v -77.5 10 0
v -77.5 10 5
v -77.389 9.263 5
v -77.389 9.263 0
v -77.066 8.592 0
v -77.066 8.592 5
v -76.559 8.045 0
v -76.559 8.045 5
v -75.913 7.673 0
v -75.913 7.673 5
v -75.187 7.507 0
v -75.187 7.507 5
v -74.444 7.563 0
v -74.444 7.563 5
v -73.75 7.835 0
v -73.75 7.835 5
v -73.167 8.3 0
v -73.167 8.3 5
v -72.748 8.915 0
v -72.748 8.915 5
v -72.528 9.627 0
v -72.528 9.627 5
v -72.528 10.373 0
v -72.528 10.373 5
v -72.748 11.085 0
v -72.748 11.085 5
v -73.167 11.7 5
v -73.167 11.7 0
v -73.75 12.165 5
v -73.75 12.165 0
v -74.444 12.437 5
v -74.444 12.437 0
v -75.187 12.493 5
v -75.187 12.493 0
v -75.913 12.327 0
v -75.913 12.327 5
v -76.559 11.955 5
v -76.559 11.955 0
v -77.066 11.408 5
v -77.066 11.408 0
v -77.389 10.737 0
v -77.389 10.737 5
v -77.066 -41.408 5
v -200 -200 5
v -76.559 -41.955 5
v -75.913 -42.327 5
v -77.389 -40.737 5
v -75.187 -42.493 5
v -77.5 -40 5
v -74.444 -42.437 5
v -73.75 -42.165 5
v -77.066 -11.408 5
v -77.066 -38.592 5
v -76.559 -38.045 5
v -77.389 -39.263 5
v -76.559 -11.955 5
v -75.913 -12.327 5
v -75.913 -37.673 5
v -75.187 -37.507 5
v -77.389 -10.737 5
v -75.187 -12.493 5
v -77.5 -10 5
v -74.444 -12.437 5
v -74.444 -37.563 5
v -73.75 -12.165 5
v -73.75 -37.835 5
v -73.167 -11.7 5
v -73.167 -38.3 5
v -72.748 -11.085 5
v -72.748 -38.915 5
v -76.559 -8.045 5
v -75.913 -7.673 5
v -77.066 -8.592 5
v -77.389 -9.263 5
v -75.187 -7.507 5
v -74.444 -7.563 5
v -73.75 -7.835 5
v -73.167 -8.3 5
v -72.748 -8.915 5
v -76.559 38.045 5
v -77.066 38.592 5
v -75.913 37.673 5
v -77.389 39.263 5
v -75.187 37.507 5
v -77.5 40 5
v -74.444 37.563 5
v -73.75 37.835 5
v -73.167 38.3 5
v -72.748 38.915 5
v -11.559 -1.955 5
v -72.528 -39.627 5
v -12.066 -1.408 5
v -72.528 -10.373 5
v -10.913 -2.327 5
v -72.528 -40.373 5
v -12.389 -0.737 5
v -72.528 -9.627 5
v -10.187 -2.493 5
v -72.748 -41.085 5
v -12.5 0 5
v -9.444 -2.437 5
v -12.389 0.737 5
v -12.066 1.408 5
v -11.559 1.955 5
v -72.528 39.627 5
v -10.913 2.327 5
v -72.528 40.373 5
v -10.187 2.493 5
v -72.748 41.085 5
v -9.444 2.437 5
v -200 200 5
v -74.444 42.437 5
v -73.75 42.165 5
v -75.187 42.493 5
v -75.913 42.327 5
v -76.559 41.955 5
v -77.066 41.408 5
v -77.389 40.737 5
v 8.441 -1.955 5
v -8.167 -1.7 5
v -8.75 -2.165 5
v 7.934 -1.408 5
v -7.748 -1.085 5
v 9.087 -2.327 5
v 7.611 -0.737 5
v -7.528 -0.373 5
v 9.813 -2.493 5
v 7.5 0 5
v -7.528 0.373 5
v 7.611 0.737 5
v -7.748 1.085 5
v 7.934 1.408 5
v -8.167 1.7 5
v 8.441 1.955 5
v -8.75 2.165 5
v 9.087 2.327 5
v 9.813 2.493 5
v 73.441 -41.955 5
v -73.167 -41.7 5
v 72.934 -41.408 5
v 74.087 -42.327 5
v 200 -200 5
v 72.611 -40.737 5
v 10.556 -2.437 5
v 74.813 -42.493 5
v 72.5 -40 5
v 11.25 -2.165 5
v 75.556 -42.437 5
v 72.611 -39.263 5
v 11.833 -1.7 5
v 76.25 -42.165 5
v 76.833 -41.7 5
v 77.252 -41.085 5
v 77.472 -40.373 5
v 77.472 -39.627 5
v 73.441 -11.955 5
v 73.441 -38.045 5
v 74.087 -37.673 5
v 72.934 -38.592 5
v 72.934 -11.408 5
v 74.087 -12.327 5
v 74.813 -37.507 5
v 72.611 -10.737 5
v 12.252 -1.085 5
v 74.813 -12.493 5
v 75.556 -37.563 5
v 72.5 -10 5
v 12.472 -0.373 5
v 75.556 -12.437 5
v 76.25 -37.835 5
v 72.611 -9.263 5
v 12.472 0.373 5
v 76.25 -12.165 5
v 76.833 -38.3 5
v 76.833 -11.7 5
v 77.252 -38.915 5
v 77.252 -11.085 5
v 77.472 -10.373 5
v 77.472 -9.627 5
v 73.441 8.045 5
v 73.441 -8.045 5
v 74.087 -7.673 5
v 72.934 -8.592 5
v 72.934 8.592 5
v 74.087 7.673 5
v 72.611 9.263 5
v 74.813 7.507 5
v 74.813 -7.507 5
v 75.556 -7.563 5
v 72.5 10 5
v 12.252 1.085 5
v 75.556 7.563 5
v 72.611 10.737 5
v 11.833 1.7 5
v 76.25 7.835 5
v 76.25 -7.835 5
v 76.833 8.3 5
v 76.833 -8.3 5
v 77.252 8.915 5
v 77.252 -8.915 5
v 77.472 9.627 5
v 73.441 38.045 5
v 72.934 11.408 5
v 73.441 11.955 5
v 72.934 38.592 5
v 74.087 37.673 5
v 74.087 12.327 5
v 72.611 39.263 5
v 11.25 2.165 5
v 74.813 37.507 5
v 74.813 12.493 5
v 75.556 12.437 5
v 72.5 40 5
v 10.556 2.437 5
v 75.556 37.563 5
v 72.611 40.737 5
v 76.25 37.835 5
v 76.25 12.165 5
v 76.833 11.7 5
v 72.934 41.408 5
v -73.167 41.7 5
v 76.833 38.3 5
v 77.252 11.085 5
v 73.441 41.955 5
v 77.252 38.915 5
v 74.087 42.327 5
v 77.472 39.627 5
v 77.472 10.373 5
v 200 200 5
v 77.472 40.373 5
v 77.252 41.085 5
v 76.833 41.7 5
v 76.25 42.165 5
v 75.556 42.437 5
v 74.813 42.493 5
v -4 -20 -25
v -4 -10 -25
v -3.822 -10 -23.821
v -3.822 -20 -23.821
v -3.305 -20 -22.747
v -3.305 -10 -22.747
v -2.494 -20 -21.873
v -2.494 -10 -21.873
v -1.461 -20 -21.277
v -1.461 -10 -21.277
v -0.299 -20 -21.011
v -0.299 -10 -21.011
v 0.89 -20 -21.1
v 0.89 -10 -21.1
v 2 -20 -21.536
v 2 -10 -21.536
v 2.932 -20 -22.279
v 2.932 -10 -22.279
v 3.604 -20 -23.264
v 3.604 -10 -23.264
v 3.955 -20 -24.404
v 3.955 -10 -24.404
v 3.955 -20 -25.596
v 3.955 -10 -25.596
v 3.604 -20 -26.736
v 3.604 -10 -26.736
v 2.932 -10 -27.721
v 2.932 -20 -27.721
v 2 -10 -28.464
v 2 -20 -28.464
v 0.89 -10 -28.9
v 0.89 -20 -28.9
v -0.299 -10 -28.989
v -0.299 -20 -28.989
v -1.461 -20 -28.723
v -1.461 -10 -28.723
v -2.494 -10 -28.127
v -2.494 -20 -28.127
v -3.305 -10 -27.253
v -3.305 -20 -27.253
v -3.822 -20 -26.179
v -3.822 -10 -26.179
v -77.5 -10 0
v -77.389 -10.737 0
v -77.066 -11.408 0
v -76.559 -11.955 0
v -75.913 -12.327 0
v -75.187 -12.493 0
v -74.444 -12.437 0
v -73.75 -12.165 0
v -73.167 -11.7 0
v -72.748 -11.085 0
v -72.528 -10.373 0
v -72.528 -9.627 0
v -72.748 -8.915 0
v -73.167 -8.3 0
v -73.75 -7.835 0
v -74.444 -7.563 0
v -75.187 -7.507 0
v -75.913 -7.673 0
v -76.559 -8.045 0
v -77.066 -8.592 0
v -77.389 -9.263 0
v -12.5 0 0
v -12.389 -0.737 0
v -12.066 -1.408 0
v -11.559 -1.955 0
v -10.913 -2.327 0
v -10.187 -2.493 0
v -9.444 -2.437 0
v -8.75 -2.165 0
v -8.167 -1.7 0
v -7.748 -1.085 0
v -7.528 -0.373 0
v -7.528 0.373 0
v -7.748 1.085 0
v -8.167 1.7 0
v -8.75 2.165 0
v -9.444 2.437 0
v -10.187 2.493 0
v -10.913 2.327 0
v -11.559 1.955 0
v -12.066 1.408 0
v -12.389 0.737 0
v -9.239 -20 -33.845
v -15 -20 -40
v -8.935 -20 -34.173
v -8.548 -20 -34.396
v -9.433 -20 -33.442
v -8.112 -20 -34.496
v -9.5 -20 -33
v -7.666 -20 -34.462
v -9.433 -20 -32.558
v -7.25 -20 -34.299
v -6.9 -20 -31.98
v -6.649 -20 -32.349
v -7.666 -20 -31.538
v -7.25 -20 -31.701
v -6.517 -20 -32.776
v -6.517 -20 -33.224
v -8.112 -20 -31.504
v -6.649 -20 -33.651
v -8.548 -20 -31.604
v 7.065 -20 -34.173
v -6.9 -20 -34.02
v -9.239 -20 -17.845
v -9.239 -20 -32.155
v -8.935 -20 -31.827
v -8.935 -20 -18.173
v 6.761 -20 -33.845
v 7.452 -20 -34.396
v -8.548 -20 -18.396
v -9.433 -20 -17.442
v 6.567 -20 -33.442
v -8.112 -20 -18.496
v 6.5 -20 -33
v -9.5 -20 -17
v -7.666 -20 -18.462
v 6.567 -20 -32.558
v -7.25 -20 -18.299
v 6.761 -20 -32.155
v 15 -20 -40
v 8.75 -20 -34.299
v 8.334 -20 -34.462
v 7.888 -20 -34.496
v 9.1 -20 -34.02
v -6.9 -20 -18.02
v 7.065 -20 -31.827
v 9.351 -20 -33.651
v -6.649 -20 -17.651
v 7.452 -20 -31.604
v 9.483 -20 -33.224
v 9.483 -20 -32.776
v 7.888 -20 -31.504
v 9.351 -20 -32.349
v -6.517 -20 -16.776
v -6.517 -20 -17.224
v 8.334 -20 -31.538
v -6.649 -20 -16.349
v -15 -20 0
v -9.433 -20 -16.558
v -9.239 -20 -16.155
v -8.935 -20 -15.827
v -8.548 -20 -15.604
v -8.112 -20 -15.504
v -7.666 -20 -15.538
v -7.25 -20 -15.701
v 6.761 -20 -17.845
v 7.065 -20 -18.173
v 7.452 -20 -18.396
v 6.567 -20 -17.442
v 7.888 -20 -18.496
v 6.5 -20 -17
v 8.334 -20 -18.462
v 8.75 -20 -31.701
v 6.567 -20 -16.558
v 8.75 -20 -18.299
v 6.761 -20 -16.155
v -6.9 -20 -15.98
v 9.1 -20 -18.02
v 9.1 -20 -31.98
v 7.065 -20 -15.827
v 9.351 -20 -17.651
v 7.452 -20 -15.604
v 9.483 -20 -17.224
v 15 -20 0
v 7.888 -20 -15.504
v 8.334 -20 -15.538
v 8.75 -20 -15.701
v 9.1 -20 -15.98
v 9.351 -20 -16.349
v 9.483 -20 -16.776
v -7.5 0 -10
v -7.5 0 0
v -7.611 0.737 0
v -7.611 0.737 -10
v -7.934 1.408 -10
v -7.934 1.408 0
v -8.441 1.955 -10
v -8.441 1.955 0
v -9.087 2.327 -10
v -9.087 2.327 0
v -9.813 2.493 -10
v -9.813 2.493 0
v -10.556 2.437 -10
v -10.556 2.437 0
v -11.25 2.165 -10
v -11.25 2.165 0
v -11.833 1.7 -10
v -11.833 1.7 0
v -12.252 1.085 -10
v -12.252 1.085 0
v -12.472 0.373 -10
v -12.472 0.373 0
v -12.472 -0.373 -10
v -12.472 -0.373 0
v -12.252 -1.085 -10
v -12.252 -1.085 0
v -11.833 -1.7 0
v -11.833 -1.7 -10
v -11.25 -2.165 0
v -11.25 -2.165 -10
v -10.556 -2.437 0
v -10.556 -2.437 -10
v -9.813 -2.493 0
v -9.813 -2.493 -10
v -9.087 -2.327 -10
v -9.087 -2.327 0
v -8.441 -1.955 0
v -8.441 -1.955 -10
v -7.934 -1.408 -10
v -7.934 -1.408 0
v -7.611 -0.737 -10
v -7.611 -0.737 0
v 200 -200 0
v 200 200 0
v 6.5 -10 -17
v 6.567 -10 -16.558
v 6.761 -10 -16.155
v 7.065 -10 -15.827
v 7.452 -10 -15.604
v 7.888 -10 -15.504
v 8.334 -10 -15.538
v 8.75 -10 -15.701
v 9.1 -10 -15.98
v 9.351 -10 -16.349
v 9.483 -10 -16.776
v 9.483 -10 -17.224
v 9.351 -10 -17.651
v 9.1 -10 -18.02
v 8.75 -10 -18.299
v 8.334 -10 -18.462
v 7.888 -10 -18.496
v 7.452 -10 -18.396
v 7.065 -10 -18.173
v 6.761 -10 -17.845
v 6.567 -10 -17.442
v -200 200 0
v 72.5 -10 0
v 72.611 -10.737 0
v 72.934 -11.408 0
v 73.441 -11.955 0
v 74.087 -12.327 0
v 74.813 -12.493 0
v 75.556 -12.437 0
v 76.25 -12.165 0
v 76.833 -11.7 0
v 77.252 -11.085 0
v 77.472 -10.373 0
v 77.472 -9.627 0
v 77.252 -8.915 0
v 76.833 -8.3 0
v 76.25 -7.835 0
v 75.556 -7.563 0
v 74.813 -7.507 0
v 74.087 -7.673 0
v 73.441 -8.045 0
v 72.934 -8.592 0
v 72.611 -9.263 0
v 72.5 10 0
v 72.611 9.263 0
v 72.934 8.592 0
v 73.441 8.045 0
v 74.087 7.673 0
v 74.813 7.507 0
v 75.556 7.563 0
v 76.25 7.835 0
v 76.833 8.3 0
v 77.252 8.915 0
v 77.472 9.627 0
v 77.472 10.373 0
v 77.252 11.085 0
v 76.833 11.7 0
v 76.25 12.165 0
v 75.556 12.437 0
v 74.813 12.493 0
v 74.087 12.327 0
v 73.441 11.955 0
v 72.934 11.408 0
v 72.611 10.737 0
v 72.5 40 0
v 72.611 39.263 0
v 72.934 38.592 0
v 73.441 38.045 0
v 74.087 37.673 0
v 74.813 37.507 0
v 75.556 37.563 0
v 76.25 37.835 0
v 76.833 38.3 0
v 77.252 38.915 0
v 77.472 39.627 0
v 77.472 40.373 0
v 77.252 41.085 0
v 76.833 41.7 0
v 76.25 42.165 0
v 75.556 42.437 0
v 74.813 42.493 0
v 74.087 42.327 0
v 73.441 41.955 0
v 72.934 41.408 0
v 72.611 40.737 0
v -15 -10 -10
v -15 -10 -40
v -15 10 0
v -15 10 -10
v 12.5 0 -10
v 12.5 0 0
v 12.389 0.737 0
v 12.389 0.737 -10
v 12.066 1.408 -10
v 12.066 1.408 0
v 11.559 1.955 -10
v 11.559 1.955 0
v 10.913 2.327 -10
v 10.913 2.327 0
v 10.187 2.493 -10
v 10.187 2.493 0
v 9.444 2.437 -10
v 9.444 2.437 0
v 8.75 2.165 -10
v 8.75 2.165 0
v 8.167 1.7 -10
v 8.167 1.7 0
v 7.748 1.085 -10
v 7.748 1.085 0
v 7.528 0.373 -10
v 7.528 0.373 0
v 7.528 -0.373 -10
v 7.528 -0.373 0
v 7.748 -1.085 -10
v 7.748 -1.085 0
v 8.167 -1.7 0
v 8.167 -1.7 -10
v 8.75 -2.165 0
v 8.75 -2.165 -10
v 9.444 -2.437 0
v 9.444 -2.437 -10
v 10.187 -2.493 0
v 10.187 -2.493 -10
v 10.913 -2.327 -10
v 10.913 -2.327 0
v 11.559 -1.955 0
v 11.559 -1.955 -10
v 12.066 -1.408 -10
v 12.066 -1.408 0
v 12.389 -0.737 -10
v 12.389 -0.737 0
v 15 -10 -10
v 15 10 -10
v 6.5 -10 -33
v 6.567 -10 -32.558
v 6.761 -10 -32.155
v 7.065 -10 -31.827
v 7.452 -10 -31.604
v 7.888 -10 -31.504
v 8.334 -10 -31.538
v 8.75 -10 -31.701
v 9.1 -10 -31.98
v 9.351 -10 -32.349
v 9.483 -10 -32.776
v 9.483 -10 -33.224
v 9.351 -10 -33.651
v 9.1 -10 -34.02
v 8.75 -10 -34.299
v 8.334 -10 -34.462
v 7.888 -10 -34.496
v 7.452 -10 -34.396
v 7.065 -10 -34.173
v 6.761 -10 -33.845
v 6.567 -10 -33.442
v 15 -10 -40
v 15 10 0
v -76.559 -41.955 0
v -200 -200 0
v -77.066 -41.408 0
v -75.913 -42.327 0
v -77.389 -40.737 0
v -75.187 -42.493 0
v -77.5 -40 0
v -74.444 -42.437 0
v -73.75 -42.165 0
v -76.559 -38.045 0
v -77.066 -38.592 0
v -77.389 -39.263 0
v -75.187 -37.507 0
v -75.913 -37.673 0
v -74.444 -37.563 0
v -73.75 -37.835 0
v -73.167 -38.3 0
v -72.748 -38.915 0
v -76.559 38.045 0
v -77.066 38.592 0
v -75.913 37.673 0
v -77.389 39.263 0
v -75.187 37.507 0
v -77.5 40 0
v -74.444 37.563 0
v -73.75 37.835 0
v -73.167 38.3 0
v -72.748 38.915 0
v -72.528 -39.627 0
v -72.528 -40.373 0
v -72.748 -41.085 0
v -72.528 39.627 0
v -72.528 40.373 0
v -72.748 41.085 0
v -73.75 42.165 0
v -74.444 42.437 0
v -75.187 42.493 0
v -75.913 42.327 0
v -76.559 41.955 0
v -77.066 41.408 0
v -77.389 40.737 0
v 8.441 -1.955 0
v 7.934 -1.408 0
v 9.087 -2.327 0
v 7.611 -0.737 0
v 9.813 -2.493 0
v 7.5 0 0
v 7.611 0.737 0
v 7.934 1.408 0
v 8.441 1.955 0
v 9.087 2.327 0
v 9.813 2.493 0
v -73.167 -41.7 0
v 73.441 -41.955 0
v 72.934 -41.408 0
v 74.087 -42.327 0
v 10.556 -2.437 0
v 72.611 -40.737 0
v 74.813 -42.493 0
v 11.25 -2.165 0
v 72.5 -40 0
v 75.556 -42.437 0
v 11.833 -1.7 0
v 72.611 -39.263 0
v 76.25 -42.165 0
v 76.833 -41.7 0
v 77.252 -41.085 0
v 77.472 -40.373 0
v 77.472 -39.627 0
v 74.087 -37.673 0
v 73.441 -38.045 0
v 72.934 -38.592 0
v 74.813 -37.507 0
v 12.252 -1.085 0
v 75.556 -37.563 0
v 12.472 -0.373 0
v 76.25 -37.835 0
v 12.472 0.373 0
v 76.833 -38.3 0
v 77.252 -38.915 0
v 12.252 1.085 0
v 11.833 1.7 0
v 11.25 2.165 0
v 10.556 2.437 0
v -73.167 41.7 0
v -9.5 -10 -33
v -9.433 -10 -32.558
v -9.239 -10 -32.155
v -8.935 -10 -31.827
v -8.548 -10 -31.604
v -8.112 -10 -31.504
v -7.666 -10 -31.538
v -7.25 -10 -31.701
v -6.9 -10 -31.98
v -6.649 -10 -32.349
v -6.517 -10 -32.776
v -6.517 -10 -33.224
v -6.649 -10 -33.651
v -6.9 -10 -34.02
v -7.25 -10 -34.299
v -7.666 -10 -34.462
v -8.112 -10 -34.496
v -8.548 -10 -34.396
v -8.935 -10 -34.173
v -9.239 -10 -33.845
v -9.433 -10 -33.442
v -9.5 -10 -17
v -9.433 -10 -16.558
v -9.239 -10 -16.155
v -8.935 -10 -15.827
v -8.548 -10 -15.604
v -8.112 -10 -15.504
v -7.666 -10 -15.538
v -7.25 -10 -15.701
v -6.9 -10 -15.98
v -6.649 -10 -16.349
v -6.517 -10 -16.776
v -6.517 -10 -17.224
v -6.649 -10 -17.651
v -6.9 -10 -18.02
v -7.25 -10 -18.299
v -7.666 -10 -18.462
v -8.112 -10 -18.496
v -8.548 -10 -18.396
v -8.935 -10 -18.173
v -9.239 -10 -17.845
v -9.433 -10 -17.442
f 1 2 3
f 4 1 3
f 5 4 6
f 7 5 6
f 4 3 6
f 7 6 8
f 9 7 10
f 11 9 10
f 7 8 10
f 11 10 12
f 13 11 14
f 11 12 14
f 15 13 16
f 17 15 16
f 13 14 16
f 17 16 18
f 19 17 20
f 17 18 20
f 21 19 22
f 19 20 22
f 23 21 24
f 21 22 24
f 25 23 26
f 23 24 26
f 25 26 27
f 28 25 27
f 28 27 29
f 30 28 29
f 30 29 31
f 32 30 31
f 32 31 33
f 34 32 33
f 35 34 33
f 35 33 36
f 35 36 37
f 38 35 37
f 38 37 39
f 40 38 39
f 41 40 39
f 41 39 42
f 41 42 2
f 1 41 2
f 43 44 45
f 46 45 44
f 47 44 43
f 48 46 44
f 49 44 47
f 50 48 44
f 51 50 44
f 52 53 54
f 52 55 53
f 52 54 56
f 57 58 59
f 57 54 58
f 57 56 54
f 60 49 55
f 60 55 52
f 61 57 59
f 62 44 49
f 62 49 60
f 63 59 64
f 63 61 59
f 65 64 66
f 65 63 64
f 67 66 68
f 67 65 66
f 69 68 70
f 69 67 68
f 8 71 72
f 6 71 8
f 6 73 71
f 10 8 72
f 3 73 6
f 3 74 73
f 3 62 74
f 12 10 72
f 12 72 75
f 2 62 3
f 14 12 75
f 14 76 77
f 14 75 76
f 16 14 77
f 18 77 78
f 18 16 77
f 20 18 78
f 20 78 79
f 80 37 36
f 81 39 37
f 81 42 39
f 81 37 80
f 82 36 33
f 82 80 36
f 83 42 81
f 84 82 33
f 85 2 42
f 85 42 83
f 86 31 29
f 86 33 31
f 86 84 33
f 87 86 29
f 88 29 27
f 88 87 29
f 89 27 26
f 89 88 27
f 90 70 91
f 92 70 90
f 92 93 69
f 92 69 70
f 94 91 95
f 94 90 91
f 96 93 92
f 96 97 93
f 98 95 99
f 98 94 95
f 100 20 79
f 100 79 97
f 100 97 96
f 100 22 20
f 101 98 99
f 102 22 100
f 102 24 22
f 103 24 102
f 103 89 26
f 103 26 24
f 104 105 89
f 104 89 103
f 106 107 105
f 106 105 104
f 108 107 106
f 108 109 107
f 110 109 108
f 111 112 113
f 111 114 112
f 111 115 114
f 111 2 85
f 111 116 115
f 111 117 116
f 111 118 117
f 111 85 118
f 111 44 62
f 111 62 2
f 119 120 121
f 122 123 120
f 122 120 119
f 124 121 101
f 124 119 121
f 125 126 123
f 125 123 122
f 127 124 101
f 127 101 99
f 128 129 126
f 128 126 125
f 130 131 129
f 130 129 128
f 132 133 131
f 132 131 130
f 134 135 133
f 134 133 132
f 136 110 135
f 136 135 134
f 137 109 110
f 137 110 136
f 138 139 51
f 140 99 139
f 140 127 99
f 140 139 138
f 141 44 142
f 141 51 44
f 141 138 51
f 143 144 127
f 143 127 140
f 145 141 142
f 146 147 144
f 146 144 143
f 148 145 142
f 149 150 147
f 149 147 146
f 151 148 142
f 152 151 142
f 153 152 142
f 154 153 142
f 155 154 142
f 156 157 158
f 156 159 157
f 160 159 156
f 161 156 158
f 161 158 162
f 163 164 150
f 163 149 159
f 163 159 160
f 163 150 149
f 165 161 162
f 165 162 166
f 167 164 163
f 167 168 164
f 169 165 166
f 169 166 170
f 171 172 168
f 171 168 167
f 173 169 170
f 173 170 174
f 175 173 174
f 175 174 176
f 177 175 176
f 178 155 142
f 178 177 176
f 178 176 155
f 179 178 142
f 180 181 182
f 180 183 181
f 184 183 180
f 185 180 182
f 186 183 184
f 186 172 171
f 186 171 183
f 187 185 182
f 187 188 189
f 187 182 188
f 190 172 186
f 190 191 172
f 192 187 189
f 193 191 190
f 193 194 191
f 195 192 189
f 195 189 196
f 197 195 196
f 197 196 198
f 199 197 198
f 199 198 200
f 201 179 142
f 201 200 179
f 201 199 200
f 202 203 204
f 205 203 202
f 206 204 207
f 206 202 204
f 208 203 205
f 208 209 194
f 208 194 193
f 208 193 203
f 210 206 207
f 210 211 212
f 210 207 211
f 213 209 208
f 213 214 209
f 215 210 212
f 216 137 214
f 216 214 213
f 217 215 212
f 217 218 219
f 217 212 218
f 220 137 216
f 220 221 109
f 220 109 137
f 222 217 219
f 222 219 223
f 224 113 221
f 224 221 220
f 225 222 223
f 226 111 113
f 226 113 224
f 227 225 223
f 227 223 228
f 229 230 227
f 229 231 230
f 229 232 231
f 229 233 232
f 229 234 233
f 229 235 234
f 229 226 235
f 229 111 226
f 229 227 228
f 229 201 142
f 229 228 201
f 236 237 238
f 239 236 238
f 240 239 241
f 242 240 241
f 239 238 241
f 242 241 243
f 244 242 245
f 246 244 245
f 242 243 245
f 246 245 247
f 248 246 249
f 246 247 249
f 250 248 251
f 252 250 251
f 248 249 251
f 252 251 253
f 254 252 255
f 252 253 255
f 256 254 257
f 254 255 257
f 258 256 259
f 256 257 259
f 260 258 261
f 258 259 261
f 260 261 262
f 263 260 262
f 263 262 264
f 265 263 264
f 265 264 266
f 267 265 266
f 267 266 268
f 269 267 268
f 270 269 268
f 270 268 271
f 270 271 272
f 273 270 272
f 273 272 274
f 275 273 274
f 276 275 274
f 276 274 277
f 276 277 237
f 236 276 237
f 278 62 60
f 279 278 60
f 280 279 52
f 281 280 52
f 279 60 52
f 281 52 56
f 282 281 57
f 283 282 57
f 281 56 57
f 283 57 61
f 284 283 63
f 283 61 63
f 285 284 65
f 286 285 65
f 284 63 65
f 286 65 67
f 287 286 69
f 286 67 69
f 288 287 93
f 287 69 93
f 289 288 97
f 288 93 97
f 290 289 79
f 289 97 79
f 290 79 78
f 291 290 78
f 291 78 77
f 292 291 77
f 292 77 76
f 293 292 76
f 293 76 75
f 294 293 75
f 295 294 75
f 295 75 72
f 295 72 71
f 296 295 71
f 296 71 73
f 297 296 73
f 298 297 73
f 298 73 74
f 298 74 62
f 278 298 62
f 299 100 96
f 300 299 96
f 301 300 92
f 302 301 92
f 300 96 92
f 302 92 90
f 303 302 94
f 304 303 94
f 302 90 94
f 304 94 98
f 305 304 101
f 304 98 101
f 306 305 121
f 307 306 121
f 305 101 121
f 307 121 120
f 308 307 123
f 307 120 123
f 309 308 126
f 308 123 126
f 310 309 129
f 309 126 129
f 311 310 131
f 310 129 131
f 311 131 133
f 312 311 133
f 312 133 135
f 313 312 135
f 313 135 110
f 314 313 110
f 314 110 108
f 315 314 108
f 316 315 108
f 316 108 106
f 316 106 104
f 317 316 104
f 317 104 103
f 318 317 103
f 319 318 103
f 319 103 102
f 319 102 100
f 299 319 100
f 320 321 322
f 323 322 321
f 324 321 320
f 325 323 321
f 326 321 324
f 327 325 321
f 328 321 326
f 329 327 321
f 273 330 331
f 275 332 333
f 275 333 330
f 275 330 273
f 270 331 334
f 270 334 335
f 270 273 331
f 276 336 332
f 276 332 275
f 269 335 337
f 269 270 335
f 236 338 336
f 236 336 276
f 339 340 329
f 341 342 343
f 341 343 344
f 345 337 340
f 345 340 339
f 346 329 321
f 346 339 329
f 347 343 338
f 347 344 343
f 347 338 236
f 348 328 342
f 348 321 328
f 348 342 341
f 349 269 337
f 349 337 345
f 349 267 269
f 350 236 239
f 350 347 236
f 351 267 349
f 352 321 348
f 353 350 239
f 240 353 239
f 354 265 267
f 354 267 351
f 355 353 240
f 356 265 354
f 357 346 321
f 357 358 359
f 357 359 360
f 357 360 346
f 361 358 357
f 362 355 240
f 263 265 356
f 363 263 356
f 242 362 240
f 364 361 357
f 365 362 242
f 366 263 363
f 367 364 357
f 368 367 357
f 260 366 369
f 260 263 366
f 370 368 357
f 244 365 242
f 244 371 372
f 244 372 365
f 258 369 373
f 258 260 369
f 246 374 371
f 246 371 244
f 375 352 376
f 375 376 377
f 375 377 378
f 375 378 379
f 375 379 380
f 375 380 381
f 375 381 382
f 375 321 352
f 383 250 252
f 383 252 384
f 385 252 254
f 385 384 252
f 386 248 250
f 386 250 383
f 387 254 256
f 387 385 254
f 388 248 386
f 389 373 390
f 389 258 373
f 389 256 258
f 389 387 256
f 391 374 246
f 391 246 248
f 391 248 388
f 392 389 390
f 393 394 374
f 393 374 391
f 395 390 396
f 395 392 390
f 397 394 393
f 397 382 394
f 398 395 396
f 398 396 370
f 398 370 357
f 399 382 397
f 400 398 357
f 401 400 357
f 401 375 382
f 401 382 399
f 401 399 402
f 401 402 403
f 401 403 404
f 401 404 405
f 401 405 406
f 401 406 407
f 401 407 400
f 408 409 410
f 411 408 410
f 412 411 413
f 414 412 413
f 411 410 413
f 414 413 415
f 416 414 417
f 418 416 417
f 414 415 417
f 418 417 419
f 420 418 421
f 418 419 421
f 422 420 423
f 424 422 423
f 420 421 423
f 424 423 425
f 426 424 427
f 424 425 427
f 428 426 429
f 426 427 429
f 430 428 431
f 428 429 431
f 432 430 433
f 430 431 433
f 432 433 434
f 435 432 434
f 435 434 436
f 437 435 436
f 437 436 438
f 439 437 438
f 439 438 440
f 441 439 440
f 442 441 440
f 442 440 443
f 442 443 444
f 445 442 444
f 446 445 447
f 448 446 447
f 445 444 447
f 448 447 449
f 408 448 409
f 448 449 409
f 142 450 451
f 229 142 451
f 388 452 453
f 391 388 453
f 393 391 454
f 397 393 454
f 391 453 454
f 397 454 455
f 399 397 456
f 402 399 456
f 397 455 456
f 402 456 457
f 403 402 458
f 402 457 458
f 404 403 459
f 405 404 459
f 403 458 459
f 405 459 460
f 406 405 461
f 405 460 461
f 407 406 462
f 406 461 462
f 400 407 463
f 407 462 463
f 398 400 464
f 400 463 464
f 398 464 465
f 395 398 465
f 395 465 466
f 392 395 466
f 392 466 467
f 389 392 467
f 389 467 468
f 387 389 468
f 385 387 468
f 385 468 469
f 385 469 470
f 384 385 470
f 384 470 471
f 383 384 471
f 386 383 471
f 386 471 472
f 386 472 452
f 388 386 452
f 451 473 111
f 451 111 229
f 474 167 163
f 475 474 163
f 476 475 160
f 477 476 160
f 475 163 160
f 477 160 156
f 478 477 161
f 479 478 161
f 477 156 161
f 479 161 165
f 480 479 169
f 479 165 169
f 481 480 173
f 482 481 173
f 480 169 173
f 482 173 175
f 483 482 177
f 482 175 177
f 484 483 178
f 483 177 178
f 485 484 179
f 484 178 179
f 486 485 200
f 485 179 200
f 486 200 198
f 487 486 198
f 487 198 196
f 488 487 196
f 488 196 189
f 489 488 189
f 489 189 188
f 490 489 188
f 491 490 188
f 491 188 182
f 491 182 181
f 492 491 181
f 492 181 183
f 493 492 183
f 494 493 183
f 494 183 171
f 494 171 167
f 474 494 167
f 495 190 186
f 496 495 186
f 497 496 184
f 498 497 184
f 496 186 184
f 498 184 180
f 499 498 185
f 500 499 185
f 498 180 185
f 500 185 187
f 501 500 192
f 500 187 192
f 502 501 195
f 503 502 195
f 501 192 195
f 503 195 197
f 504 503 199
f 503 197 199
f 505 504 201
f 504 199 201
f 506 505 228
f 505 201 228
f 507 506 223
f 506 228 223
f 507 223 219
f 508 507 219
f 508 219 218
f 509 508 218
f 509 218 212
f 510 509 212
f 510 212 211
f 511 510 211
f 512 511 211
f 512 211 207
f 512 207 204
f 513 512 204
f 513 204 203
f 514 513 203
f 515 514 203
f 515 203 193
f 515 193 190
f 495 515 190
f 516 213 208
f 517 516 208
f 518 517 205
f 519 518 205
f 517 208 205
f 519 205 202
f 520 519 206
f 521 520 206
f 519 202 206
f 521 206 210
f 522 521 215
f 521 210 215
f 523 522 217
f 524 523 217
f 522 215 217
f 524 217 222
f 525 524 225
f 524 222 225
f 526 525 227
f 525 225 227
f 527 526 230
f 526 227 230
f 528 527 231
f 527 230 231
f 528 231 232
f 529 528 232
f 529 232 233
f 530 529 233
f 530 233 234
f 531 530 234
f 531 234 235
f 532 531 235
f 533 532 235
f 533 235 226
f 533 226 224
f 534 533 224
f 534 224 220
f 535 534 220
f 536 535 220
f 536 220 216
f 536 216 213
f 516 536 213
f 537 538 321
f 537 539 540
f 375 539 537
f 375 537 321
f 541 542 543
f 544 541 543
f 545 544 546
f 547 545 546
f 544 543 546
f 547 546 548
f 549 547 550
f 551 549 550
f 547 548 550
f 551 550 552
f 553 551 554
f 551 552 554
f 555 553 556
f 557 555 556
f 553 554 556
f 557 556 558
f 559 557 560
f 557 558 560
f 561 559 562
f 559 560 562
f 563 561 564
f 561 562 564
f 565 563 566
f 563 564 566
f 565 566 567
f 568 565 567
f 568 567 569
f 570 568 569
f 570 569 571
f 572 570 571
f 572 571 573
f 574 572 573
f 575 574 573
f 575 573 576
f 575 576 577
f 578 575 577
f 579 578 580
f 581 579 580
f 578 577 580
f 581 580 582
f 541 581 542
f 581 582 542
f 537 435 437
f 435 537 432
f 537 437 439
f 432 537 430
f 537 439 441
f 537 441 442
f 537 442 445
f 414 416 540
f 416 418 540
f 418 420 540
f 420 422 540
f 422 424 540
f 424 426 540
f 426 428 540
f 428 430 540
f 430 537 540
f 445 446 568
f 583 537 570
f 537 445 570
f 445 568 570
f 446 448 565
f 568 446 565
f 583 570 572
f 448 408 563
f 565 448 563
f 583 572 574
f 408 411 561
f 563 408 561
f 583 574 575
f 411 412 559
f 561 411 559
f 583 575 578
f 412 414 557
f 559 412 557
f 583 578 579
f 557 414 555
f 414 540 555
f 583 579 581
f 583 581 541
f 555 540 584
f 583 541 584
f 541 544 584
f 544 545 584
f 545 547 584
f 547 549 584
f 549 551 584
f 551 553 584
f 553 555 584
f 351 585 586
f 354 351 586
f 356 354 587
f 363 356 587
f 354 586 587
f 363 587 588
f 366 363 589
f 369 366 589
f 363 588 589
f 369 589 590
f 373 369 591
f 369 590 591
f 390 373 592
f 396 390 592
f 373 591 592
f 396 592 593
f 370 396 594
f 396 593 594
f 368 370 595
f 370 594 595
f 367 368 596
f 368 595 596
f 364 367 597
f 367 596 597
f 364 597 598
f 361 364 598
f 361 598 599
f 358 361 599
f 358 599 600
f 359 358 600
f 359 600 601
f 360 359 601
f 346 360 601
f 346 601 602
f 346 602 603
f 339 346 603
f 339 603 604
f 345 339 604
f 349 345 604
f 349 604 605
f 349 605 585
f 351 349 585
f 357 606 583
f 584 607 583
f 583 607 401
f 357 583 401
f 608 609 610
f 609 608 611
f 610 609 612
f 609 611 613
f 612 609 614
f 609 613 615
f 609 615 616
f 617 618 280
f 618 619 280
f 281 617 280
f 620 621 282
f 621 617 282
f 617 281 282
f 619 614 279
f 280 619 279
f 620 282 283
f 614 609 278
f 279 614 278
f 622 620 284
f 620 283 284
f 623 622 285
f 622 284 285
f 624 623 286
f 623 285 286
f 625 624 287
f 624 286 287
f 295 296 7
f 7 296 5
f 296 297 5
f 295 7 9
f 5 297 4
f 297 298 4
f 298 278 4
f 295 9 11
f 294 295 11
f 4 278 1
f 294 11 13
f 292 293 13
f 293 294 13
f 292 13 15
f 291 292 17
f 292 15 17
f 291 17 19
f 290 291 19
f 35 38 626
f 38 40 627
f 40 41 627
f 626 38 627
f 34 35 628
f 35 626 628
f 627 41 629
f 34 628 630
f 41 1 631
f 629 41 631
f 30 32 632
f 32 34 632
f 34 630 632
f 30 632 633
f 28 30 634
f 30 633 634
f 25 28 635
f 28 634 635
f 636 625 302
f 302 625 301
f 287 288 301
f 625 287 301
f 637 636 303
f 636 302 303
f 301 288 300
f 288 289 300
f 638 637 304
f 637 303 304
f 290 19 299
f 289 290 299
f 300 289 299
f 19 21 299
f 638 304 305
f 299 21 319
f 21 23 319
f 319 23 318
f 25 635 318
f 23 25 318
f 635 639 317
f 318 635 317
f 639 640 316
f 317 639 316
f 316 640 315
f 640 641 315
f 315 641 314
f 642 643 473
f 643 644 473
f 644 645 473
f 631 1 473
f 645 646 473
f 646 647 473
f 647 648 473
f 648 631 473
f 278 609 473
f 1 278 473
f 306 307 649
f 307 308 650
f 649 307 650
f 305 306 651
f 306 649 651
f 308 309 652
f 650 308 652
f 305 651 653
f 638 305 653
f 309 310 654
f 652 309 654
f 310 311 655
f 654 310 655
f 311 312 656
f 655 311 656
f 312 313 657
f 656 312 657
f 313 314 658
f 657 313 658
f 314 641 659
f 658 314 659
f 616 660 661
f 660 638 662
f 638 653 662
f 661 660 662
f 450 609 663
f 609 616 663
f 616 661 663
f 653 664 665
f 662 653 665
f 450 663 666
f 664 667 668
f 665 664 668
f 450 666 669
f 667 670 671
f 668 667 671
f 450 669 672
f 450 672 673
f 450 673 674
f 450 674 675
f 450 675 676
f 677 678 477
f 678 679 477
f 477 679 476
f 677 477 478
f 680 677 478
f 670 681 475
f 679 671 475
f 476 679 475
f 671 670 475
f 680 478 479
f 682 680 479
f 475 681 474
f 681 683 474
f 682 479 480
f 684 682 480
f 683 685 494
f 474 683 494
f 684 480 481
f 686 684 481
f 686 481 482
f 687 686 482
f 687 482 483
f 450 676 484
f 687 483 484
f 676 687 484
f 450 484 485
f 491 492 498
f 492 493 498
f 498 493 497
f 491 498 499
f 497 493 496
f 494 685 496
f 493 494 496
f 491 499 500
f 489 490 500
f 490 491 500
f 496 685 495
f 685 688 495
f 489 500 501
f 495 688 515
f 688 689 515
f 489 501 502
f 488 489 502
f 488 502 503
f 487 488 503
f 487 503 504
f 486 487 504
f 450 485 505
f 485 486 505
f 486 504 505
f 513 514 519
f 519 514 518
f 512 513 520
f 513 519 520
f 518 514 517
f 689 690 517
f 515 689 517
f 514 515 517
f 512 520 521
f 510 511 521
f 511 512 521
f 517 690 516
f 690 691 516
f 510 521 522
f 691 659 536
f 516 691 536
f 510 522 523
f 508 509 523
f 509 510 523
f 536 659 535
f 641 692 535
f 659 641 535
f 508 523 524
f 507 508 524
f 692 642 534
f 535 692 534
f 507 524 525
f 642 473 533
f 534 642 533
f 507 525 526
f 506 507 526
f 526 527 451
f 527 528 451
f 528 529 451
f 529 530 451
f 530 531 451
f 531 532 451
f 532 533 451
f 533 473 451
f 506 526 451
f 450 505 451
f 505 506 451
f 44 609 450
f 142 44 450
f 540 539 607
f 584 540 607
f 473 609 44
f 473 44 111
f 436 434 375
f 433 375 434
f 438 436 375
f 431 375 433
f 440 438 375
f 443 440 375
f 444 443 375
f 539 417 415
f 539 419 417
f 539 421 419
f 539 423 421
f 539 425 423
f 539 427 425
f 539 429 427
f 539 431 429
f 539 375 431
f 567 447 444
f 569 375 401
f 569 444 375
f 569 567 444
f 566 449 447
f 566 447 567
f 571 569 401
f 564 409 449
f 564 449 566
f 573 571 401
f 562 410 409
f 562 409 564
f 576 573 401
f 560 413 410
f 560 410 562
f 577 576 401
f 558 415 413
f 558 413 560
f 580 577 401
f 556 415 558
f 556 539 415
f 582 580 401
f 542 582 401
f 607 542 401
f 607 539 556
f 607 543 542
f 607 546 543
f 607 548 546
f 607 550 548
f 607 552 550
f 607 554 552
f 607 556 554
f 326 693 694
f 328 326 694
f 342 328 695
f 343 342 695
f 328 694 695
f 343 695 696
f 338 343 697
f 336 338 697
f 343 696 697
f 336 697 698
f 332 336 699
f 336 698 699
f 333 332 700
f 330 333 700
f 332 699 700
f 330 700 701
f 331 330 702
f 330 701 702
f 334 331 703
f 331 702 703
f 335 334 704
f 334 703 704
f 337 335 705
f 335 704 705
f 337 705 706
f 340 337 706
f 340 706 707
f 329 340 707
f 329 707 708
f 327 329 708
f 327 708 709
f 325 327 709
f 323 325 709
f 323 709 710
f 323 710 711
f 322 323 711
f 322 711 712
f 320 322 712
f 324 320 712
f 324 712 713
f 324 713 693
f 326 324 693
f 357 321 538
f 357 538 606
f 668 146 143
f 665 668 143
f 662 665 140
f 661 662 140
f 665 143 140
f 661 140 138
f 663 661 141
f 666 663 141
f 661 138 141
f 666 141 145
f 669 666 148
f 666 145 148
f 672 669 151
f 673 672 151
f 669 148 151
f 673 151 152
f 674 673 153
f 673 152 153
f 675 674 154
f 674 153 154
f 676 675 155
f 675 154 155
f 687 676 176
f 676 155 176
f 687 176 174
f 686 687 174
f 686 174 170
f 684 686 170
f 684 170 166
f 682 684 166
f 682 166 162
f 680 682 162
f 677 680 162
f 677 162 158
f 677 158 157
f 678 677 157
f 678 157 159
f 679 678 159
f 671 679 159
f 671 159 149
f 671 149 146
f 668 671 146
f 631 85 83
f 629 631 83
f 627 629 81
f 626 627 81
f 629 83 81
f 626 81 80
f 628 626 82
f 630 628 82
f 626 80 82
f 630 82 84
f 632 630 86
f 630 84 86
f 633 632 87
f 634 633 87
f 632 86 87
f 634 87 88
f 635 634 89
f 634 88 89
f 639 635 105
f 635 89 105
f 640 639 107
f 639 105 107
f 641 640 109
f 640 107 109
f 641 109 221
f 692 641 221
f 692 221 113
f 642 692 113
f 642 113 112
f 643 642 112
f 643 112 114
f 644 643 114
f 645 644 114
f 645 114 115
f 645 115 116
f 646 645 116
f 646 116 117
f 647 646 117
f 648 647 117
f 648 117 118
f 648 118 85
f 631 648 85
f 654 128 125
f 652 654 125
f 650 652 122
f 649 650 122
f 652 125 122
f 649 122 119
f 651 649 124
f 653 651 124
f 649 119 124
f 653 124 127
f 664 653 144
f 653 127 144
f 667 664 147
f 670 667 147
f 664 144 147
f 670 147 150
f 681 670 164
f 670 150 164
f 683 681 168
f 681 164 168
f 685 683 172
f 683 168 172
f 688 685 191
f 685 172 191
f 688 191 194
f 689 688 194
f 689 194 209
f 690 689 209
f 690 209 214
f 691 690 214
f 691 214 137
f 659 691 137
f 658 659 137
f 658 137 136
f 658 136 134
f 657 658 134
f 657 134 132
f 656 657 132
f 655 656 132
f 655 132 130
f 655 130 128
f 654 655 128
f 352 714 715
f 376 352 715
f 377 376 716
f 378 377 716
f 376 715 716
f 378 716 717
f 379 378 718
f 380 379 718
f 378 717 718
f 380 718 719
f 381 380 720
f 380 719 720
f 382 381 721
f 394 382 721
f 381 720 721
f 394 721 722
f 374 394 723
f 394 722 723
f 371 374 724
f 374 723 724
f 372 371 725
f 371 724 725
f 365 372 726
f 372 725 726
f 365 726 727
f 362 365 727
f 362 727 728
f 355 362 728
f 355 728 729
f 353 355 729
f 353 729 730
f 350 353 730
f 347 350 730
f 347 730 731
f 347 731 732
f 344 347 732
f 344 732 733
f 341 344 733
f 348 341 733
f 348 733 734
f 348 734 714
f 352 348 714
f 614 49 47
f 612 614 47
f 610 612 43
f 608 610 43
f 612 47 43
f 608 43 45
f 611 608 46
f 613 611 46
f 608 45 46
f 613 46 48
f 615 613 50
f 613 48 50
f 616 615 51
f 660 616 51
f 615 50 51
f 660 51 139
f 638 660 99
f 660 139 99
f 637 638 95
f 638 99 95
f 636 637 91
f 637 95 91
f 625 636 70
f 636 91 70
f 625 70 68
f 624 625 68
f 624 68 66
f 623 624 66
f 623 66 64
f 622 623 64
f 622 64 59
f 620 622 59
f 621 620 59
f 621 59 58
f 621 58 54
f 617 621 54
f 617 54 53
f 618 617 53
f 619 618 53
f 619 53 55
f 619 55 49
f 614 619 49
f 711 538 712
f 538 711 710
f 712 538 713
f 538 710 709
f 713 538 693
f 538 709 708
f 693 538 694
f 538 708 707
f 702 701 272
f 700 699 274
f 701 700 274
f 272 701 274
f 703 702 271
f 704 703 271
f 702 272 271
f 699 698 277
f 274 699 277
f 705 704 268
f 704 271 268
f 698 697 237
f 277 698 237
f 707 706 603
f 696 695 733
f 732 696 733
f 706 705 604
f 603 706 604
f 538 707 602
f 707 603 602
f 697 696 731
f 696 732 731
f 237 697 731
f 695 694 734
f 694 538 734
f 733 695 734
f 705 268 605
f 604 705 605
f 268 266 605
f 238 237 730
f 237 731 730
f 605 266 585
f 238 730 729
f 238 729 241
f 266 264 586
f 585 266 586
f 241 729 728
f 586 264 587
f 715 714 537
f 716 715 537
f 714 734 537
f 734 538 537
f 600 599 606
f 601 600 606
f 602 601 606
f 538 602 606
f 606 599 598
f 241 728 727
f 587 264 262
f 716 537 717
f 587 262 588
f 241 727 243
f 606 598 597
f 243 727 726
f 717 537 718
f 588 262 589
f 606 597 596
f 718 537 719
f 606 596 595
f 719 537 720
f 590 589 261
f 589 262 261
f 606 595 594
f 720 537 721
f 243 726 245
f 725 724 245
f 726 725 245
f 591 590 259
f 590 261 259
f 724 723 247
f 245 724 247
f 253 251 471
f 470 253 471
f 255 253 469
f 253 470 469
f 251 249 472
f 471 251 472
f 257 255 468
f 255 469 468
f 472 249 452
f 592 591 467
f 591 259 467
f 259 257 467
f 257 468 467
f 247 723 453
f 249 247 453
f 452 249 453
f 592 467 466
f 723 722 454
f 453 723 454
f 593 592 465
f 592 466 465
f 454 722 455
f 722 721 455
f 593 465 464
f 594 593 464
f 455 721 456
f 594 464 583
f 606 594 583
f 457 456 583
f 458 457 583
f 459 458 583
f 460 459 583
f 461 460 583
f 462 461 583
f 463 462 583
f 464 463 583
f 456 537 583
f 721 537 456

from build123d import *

# Parameters (mm, degrees)
F0_W     = 400
F0_H     = 400
F1_DEPTH = 5
F3_D     = 5
F4_W     = 30
F4_H     = 30
F4_R     = 2.5
F5_DEPTH = 10
F6_W     = 30
F6_H     = 10
F7_DEPTH = 30
F9_D     = 3
F10_D    = 8


with BuildPart() as f1:
    # F0 (on Top) → F1 (new body)
    with BuildSketch(Plane.XY):
        Rectangle(F0_W, F0_H)
    extrude(amount=F1_DEPTH)

    # F3 (through all)
    with Locations(Plane(origin=(0, 0, 0), x_dir=(1, 0, 0), z_dir=(0, 0, -1))):
        with Locations((-75, -40), (-75, -10), (-75, 10), (-75, 40), (75, -40), (75, -10), (75, 10), (75, 40), (-10, 0), (10, 0)):
            Hole(F3_D / 2)


with BuildPart() as f5:
    # F4 (on face) → F5 (new body)
    with BuildSketch(Plane.XY):
        with Locations((0, -5)):
            Rectangle(F4_W, F4_H)
        with Locations((-10, 0)):
            Circle(F4_R, mode=Mode.SUBTRACT)
        with Locations((10, 0)):
            Circle(F4_R, mode=Mode.SUBTRACT)
    extrude(amount=-F5_DEPTH)

    # F6 (on face) → F7 (join)
    with BuildSketch(Plane(origin=(0, 0, -10), x_dir=(1, 0, 0), z_dir=(0, 0, -1))):
        with Locations((0, 15)):
            Rectangle(F6_W, F6_H)
    extrude(amount=F7_DEPTH)

    # F9 (through all)
    with Locations(Plane.XZ.offset(20)):
        with Locations((-8, -17), (-8, -33), (8, -17), (8, -33)):
            Hole(F9_D / 2)

    # F10 (through all)
    with Locations(Plane.XZ.offset(20)):
        with Locations((0, -25)):
            Hole(F10_D / 2)


solid = Compound([f1.part, f5.part])
